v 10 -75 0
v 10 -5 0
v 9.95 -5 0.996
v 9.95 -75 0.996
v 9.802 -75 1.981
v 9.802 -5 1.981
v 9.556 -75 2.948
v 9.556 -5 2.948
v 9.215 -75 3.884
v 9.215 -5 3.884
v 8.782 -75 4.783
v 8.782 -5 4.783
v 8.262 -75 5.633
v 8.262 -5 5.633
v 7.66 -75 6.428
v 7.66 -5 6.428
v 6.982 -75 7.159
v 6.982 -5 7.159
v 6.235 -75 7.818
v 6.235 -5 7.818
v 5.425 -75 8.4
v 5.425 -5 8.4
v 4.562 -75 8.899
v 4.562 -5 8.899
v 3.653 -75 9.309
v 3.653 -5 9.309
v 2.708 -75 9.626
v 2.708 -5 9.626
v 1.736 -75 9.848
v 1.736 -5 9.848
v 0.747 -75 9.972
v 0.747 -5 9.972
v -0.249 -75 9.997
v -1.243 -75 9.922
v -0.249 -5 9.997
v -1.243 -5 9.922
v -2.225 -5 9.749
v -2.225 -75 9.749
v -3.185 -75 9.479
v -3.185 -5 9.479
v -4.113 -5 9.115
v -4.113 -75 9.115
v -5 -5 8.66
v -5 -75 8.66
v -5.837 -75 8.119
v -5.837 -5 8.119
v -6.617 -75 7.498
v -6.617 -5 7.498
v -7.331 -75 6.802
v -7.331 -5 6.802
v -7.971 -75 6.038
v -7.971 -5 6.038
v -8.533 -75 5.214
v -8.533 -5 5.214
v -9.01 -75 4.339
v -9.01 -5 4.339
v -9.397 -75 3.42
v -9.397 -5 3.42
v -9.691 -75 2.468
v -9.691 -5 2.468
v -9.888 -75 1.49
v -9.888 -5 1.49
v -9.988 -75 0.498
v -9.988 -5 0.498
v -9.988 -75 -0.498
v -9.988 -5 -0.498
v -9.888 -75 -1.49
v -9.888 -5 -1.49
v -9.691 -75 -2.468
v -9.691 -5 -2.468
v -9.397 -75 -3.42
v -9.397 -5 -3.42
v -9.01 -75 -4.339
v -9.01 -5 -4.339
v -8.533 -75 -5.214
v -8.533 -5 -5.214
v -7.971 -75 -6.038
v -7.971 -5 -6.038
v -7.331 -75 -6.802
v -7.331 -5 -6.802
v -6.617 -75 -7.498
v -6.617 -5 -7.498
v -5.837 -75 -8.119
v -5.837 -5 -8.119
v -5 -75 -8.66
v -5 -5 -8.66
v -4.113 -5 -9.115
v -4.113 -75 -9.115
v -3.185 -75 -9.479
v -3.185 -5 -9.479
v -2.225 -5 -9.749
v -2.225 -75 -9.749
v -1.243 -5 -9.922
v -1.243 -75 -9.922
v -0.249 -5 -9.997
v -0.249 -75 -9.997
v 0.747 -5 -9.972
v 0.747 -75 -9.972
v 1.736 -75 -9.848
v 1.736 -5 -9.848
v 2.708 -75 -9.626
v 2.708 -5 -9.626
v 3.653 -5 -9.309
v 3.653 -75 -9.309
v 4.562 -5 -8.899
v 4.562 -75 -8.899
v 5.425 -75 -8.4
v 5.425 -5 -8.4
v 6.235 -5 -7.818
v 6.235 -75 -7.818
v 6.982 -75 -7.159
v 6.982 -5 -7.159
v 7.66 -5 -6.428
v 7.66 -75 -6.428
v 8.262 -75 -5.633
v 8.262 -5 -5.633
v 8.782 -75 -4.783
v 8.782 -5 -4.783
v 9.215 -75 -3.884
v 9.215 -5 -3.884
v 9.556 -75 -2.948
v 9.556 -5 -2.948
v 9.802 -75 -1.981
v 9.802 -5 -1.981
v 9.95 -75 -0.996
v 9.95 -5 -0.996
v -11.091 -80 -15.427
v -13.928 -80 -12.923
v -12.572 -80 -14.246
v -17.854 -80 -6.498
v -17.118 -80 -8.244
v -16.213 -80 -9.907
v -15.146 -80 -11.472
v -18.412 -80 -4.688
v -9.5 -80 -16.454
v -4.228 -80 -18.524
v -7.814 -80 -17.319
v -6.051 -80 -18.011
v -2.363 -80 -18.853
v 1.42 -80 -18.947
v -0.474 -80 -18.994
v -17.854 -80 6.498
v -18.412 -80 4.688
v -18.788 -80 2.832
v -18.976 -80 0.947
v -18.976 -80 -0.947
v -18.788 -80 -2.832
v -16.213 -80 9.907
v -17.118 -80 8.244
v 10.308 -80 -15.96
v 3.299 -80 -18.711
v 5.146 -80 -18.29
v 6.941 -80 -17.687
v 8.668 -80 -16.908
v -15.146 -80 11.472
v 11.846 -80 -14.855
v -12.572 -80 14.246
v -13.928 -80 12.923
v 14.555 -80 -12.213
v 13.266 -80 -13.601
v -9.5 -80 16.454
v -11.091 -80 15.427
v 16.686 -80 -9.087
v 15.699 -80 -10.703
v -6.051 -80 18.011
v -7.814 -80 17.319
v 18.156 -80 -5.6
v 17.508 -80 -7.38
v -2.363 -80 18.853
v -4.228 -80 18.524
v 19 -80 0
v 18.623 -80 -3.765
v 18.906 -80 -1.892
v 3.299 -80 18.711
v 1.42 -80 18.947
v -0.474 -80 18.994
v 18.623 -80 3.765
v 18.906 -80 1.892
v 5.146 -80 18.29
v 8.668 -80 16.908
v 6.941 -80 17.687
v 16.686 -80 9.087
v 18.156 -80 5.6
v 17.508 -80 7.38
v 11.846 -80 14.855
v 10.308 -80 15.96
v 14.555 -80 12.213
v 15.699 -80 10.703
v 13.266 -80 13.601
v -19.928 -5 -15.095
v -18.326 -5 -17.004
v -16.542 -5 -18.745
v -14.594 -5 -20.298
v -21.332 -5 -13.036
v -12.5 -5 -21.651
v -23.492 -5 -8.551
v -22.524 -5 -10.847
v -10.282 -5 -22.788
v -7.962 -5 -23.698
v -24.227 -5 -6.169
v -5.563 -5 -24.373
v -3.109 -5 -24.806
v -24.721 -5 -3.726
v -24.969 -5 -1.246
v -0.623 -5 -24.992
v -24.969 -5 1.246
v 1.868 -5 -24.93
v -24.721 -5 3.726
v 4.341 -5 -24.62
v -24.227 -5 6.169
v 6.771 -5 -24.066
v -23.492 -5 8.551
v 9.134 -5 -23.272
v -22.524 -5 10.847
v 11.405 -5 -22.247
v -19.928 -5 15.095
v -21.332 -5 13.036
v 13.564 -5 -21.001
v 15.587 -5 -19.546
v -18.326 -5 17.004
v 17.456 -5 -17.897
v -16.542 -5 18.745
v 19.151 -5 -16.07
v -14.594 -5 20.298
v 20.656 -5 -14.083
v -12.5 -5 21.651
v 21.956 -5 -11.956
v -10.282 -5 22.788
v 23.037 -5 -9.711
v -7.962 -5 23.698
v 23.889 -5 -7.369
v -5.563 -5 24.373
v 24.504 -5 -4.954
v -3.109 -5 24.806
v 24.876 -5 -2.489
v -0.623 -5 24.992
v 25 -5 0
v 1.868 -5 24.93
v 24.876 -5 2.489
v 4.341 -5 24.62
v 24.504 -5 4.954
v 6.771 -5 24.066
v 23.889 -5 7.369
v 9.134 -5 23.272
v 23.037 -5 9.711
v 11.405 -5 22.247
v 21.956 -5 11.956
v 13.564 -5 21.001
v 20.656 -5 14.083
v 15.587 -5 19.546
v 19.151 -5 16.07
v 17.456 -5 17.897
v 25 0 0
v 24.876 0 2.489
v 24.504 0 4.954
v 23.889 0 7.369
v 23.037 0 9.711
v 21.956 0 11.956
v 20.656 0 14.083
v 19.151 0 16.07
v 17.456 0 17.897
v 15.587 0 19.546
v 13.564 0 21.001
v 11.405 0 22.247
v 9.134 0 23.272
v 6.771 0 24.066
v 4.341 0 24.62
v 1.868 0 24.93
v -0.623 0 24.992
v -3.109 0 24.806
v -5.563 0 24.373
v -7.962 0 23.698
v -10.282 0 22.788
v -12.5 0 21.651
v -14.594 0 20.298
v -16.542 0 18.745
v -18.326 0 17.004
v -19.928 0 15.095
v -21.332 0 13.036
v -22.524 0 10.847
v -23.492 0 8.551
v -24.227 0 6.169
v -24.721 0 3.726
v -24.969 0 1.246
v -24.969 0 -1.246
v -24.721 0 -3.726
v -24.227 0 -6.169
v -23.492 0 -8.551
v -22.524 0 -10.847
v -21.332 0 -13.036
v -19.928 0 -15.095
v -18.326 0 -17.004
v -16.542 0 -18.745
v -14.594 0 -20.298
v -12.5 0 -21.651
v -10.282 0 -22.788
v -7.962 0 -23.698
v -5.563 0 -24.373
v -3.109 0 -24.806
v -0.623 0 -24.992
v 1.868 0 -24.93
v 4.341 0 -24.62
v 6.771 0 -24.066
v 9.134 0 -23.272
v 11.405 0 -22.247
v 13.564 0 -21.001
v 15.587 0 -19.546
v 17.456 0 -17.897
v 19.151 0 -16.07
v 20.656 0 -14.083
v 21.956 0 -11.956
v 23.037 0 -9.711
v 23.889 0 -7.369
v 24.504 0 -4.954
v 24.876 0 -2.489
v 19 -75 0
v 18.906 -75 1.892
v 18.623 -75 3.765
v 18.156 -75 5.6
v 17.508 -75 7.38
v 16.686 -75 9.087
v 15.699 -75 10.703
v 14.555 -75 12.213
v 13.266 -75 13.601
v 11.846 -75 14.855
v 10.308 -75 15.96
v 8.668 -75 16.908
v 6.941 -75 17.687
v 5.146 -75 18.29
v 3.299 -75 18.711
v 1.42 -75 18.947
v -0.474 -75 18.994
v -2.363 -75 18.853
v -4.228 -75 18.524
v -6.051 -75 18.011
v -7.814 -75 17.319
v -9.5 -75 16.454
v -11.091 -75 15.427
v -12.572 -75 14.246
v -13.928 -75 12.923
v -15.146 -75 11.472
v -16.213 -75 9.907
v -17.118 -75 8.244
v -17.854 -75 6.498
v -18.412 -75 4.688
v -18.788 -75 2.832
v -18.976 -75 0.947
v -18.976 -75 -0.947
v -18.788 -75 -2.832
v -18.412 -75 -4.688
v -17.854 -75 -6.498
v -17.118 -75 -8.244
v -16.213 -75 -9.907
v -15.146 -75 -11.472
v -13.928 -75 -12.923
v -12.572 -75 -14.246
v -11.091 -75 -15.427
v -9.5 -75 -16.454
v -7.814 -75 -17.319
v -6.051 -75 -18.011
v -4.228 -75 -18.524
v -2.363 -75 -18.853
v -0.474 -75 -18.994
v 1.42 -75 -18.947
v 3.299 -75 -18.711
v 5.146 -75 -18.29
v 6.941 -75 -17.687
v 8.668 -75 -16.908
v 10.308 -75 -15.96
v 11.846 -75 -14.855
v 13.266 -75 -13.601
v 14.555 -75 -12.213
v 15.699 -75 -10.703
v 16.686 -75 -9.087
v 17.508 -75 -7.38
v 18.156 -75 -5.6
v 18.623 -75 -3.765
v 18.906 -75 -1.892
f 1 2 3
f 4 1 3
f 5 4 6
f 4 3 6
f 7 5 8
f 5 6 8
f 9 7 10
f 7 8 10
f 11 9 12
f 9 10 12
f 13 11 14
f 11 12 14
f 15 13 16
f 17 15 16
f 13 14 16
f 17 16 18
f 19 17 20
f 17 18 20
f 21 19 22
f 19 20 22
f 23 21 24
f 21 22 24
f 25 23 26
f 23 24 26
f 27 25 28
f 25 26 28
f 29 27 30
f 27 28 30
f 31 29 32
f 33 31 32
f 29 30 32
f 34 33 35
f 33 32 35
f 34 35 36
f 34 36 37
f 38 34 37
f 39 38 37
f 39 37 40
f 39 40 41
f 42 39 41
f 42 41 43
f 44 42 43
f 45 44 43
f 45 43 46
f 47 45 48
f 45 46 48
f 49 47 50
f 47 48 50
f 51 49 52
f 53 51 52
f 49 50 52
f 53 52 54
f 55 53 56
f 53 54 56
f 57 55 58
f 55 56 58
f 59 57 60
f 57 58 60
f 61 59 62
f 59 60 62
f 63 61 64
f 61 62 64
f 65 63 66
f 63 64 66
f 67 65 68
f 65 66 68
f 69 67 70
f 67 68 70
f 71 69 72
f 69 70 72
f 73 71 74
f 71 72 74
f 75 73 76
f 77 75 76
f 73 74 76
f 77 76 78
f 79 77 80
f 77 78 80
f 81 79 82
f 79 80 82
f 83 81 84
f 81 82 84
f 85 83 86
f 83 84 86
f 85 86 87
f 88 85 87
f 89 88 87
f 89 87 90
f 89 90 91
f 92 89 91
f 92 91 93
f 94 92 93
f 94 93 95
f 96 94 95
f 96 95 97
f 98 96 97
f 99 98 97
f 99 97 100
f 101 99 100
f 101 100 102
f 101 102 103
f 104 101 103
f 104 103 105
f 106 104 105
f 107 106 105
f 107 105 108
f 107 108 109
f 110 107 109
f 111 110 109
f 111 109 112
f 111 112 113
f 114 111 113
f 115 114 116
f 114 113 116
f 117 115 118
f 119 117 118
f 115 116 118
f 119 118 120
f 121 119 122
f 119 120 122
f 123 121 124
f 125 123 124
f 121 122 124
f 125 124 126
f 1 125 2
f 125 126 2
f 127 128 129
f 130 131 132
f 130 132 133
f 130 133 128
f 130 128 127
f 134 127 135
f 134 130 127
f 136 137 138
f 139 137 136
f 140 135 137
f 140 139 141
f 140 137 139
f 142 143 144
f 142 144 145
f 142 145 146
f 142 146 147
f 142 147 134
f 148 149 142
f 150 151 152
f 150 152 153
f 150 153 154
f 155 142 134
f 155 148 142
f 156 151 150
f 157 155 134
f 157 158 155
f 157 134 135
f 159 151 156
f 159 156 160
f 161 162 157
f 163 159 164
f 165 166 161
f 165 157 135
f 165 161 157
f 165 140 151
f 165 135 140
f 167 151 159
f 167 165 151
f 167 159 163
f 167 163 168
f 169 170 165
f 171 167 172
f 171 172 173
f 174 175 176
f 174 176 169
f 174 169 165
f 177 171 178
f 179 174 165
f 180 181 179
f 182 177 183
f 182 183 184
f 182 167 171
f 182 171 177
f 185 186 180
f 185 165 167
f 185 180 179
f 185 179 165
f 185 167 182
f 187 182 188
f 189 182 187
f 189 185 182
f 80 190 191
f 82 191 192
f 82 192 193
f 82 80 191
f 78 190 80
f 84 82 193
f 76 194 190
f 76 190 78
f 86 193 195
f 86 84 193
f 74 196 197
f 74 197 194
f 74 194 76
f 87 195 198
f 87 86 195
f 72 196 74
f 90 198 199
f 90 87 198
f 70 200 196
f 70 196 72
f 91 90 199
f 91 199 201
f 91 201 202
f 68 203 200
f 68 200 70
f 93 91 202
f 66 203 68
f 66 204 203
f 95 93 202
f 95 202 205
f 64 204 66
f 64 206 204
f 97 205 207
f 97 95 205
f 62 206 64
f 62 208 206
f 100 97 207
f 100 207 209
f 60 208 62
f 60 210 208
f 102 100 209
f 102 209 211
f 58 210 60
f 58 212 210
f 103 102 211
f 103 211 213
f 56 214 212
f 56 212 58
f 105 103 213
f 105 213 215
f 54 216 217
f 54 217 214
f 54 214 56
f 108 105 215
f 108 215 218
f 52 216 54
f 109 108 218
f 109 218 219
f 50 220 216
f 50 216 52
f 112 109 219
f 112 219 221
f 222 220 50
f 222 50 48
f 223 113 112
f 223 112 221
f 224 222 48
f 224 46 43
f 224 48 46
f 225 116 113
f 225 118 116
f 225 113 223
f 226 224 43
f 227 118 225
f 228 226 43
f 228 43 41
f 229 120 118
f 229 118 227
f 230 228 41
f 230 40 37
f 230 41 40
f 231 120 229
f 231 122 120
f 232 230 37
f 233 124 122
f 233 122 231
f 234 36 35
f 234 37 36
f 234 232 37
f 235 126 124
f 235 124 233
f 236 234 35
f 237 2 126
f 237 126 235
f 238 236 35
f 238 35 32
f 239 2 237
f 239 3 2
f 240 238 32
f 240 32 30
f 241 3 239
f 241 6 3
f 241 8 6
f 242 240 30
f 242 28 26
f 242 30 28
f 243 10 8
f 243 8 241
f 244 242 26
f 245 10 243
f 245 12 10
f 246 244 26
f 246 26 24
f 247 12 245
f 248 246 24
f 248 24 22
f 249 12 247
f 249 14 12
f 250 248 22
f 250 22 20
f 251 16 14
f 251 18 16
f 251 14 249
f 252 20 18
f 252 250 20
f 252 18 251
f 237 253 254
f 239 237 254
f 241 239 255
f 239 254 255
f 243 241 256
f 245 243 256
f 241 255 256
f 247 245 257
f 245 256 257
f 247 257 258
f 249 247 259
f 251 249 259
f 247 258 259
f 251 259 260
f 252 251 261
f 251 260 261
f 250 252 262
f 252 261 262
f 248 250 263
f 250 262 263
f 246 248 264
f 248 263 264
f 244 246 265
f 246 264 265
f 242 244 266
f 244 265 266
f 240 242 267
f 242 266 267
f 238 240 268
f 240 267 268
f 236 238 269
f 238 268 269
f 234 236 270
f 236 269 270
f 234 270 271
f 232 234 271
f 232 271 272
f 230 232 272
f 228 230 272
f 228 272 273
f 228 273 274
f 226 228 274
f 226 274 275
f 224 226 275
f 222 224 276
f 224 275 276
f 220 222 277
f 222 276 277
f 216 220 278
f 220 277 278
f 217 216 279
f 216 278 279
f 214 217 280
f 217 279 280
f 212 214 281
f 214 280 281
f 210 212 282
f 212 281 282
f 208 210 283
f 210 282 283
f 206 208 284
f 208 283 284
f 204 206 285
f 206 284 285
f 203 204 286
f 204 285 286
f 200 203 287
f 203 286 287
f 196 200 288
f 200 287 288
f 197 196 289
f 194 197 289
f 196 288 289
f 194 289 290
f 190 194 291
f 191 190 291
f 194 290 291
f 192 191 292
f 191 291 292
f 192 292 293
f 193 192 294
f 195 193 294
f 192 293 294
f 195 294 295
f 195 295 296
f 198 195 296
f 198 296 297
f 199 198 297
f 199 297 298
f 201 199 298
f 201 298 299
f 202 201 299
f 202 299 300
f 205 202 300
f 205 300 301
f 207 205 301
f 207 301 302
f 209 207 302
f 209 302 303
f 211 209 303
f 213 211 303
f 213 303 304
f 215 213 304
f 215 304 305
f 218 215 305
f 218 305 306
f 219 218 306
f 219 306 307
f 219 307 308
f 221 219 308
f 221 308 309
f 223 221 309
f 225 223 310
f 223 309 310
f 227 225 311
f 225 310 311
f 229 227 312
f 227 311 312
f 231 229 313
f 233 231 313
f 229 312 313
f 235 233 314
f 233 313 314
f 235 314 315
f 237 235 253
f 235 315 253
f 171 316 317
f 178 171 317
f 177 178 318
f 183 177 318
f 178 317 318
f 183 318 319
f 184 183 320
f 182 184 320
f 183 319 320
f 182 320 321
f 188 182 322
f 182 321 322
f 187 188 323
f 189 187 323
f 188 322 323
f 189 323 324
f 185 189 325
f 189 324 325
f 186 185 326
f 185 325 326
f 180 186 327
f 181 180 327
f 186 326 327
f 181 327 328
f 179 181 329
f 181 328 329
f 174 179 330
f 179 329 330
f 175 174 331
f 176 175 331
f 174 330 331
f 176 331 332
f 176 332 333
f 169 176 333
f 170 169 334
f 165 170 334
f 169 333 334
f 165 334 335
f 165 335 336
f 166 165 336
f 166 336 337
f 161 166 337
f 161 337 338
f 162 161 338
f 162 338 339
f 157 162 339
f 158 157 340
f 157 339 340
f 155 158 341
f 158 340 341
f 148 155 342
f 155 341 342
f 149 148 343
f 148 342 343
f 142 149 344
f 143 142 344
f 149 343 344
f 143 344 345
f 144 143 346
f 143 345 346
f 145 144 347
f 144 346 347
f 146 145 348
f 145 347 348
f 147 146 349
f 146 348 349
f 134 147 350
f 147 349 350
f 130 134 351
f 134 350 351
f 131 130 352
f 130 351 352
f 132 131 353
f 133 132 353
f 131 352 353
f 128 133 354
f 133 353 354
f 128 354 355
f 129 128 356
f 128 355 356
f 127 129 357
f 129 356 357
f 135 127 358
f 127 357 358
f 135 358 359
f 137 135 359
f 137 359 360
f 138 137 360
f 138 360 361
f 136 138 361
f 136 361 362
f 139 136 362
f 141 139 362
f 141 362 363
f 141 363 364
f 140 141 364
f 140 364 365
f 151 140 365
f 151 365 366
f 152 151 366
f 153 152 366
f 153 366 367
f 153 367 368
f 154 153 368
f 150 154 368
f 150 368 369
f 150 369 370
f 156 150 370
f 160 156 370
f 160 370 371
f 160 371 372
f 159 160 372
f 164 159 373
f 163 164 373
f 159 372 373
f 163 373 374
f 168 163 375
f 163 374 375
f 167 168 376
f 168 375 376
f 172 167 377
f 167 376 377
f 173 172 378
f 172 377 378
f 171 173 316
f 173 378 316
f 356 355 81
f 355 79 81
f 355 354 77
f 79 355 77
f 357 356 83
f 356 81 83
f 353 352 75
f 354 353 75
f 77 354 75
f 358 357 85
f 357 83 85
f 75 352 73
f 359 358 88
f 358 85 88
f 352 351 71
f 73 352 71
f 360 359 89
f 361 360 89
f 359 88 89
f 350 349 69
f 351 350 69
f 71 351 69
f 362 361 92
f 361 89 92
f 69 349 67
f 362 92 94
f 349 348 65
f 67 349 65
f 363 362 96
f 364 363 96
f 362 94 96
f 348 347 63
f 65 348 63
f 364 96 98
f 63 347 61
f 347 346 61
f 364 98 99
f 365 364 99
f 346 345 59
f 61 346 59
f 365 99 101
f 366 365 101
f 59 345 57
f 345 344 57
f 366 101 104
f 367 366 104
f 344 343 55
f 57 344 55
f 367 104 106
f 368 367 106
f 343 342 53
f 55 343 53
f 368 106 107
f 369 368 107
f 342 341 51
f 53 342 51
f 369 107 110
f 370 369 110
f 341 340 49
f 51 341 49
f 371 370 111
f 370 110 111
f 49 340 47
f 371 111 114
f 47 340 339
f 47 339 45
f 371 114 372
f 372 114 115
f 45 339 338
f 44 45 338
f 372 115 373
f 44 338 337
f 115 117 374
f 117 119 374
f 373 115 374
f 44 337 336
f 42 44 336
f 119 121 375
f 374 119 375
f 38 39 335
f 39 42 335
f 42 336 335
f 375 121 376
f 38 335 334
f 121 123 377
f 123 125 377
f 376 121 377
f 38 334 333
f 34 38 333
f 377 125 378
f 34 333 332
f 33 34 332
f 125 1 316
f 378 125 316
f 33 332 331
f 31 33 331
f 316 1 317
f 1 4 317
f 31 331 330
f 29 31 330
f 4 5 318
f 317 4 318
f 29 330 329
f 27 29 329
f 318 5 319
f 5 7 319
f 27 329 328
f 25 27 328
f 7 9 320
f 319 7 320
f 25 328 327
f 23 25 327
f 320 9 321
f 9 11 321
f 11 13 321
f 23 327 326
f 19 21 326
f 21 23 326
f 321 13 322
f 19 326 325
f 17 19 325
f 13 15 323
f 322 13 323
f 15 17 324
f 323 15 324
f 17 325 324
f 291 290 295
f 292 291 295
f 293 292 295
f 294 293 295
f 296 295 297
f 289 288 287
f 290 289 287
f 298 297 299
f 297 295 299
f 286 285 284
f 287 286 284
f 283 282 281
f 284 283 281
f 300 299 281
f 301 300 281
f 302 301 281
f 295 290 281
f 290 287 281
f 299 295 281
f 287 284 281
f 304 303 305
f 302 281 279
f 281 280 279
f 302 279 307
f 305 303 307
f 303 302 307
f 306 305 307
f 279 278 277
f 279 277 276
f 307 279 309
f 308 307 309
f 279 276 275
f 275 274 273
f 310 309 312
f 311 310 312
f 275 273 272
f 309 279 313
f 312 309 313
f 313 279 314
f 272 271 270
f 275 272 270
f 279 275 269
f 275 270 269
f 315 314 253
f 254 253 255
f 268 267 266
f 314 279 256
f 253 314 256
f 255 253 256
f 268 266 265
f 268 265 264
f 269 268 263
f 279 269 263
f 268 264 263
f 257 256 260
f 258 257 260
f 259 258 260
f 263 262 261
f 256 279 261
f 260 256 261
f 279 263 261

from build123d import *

# Parameters (mm, degrees)
F0_R     = 25
F1_DEPTH = 5
F2_R     = 10
F3_DEPTH = 70
F4_R     = 19
F5_DEPTH = 5


with BuildPart() as f1:
    # F0 (on Front) → F1 (new body)
    with BuildSketch(Plane.XZ):
        Circle(F0_R)
    extrude(amount=F1_DEPTH)

    # F2 (on face) → F3 (join)
    with BuildSketch(Plane.XZ.offset(5)):
        Circle(F2_R)
    extrude(amount=F3_DEPTH)

    # F4 (on face) → F5 (join)
    with BuildSketch(Plane.XZ.offset(75)):
        Circle(F4_R)
    extrude(amount=F5_DEPTH)


solid = f1.part
